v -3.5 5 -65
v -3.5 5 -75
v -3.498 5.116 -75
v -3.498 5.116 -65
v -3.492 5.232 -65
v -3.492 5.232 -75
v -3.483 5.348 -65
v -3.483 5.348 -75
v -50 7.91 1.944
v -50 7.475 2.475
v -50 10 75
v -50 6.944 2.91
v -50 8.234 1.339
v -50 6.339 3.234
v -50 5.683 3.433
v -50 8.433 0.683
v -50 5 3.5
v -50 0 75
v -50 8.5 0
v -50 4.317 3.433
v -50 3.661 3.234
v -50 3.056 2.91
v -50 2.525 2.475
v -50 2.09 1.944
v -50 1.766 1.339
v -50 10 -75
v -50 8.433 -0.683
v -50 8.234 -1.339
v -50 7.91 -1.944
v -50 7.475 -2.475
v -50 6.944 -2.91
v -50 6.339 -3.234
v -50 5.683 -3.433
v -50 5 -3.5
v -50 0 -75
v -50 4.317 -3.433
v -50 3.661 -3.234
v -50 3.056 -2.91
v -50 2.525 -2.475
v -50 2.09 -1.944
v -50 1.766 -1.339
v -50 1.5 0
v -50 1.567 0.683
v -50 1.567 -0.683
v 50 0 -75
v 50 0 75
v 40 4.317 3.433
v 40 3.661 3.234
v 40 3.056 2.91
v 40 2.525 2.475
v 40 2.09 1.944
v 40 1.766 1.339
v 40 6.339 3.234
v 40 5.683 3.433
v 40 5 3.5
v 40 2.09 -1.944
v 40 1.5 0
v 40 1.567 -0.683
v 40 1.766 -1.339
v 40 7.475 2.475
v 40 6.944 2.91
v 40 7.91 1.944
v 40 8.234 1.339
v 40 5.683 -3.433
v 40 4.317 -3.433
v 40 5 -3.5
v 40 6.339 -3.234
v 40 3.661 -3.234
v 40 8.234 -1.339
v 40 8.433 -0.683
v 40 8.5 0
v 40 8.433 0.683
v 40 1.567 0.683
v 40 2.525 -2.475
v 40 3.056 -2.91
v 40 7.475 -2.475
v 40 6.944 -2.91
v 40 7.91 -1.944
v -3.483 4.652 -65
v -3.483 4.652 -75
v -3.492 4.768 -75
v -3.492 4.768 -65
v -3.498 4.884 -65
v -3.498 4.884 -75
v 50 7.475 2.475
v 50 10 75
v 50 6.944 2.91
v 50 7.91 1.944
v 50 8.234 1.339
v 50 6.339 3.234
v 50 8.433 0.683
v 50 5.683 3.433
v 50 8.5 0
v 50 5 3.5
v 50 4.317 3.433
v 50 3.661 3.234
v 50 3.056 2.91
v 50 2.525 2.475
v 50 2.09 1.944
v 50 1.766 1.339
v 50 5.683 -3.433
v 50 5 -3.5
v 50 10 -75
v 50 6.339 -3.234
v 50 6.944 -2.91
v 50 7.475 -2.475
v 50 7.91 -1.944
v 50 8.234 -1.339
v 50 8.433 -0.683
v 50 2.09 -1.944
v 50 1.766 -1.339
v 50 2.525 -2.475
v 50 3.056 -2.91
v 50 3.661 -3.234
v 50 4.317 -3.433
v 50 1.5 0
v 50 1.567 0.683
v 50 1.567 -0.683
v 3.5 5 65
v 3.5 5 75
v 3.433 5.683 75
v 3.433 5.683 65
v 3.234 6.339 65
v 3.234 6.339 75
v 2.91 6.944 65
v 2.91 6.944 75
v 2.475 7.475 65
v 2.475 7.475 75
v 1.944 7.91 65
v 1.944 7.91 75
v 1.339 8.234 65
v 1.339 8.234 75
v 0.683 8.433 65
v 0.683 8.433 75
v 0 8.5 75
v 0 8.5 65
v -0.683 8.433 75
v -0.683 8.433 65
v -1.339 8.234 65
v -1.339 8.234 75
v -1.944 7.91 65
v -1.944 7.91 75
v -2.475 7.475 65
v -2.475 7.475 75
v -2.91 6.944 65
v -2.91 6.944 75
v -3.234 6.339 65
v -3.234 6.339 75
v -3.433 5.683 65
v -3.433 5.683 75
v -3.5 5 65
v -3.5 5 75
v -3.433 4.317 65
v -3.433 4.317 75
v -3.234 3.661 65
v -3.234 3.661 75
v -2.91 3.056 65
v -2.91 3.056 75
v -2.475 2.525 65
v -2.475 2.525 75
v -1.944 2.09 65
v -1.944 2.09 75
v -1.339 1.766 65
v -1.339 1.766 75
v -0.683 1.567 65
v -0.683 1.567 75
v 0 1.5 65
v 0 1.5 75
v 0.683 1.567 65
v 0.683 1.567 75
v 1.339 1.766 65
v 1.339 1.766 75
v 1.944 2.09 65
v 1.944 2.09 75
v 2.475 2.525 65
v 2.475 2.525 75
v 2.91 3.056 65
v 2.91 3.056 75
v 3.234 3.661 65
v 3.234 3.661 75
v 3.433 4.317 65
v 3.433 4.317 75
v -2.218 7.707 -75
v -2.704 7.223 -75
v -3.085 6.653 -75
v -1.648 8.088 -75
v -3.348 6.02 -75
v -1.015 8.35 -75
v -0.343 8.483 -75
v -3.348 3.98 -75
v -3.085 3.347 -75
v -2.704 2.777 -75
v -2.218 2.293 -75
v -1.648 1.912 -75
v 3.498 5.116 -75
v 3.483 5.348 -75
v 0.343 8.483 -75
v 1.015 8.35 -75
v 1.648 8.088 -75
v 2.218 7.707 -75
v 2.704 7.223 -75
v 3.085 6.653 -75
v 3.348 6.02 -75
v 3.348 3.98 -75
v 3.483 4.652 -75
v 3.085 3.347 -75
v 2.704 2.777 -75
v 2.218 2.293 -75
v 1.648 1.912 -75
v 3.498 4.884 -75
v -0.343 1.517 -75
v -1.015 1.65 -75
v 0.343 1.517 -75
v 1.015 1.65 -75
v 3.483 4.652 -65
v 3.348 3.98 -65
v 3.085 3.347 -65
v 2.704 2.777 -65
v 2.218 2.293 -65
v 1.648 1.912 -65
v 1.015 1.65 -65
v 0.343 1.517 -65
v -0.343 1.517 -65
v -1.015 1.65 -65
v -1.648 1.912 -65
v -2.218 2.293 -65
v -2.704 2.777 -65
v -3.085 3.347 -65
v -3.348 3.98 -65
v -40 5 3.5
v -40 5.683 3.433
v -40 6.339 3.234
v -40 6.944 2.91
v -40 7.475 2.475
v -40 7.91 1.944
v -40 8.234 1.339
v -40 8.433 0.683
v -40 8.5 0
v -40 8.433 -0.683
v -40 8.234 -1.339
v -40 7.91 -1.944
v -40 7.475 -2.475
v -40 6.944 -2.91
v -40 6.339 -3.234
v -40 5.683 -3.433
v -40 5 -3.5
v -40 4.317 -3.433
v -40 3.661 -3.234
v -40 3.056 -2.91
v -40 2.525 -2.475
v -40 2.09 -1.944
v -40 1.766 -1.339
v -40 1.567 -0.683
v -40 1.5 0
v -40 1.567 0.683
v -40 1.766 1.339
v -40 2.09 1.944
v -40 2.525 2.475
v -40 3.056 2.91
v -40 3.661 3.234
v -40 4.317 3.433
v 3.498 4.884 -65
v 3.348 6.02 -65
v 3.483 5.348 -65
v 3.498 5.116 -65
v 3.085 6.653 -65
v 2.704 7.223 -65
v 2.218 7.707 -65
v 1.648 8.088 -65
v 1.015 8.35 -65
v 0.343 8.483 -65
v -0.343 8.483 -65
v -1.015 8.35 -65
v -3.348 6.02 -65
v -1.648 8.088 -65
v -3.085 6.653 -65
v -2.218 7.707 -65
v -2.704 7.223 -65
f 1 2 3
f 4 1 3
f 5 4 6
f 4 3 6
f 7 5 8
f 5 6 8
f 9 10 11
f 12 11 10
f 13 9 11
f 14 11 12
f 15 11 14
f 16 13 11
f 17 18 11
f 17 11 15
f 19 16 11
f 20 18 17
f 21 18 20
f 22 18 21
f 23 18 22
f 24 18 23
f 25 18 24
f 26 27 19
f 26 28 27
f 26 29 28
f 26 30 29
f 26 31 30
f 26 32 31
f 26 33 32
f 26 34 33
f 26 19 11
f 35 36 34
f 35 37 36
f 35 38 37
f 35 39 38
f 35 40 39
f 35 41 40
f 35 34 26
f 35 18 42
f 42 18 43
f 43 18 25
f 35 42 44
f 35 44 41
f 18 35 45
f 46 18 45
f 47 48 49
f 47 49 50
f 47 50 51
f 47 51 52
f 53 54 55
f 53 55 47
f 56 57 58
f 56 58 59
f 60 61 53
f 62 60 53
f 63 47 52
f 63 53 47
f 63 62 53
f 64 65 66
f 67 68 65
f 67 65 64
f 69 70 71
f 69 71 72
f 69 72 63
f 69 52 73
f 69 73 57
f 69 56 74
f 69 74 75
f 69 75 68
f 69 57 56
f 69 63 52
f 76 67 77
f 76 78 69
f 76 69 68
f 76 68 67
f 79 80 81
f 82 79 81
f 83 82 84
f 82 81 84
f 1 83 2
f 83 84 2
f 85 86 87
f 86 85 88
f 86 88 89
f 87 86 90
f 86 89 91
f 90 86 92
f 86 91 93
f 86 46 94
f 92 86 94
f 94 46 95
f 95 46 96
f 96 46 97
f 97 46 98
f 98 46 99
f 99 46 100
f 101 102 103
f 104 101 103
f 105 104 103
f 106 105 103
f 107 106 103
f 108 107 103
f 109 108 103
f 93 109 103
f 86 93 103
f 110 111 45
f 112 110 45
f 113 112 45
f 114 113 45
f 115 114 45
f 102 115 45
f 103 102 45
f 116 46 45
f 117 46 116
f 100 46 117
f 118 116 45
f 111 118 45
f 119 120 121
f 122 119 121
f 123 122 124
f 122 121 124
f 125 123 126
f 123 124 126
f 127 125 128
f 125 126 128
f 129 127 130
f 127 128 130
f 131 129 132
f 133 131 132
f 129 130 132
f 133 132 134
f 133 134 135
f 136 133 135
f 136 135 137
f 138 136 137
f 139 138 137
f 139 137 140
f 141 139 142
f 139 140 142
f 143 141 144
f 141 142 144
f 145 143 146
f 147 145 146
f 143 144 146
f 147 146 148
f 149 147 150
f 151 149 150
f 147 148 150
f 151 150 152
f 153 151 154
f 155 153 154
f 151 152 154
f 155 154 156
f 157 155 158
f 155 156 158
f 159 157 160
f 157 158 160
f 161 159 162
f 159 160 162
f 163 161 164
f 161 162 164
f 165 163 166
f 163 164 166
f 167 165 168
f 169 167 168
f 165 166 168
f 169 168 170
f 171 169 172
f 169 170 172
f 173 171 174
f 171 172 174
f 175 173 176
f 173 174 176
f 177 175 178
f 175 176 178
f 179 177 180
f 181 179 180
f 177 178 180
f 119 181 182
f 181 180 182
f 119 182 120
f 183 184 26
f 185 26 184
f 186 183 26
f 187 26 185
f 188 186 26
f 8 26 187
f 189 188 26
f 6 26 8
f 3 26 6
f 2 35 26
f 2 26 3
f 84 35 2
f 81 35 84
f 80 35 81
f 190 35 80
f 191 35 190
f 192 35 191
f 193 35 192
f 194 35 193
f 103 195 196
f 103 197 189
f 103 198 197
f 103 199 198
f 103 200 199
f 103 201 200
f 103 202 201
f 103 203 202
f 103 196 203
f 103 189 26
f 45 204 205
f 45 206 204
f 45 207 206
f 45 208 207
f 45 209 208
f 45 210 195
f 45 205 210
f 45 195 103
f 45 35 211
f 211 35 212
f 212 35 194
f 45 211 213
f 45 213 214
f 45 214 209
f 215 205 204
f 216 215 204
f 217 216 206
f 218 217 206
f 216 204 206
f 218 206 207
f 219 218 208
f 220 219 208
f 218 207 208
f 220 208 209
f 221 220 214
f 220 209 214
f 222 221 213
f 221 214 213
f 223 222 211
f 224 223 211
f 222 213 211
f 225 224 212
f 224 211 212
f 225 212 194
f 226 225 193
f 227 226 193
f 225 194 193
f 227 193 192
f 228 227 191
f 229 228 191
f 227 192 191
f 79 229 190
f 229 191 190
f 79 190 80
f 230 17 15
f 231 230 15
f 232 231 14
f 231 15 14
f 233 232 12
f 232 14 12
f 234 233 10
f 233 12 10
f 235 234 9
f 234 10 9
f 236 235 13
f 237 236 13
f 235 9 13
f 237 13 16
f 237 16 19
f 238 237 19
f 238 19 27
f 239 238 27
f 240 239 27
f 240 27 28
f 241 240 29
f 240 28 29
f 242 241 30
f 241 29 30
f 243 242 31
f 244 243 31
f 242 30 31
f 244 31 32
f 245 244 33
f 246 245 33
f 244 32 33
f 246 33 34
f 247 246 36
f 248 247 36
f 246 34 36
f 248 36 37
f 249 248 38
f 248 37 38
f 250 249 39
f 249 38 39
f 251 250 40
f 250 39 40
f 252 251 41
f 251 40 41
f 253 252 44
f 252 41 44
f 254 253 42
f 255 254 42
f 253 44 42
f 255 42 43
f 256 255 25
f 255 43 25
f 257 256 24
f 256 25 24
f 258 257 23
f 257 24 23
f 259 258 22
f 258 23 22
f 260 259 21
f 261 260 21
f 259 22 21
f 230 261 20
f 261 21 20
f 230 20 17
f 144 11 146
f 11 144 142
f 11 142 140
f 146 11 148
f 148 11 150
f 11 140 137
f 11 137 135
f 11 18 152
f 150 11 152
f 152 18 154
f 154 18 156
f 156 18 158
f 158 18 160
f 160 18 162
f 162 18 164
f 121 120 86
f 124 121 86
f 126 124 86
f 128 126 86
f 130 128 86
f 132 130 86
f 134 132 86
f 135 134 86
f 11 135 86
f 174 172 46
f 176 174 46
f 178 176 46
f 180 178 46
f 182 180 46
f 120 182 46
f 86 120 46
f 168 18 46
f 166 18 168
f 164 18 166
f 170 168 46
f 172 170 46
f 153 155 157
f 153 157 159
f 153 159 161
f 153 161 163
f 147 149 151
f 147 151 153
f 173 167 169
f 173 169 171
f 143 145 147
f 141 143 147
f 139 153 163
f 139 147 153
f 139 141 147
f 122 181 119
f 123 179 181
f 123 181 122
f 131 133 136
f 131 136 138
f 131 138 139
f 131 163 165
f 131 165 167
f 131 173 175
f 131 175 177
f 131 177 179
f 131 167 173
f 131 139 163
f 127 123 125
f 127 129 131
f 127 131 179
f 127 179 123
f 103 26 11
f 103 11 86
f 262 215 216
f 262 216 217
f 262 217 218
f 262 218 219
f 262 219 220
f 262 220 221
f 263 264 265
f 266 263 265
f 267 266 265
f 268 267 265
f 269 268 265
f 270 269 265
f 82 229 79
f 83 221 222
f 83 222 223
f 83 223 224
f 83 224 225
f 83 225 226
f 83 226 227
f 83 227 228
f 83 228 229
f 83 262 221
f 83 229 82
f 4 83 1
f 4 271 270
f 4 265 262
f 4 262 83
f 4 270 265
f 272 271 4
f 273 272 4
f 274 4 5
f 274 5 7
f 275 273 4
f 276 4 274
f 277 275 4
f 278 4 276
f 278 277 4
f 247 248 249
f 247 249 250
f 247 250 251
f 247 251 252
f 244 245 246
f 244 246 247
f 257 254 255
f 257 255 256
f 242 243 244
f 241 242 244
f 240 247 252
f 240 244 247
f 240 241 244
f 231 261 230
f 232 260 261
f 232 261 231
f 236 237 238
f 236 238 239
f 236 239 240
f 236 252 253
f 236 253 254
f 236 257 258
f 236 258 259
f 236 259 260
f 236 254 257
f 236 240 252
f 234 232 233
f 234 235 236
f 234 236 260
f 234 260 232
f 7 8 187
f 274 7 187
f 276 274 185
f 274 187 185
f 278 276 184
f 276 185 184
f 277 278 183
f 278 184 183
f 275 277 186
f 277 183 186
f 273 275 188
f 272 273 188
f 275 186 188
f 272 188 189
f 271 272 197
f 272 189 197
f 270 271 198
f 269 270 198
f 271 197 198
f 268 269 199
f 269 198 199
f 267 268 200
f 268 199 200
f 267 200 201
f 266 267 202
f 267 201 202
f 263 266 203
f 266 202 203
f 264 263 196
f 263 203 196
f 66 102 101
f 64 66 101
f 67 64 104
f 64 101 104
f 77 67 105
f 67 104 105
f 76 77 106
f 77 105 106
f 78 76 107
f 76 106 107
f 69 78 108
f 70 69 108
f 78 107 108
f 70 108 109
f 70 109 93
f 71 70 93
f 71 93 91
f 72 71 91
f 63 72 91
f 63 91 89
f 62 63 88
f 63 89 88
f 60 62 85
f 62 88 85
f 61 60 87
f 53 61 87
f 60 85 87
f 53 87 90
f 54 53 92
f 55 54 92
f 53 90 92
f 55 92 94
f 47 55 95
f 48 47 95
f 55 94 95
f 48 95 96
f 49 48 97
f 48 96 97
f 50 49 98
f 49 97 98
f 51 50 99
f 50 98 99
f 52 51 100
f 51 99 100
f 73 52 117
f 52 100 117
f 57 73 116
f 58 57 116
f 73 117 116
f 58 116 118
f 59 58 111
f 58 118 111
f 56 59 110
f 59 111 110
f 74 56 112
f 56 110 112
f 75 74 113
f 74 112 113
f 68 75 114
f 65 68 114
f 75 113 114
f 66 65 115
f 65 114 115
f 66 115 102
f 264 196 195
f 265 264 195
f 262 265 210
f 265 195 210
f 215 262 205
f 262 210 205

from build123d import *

# Parameters (mm, degrees)
SKETCH_1_W          = 100
SKETCH_1_H          = 150
EXTRUDE_1_DEPTH     = 10
SKETCH_2_R          = 3.5
CUT_EXTRUDE_1_DEPTH = 10
SKETCH_3_R          = 3.5
CUT_EXTRUDE_2_DEPTH = 10
CUT_EXTRUDE_3_DEPTH = 10
SKETCH_5_R          = 3.5
CUT_EXTRUDE_4_DEPTH = 10


with BuildPart() as part:
    # 草图1 → 凸台-拉伸1 (new body)
    with BuildSketch(Plane(origin=(0, 0, 0), x_dir=(1, 0, 0), z_dir=(0, 1, 0))):
        Rectangle(SKETCH_1_W, SKETCH_1_H)
    extrude(amount=EXTRUDE_1_DEPTH)

    # 草图2 → 切除-拉伸1 (cut)
    with BuildSketch(Plane.XY.offset(75)):
        with Locations((0, 5)):
            Circle(SKETCH_2_R)
    extrude(amount=-CUT_EXTRUDE_1_DEPTH, mode=Mode.SUBTRACT)

    # 草图3 → 切除-拉伸2 (cut)
    with BuildSketch(Plane(origin=(50, 0, 0), x_dir=(0, 0, -1), z_dir=(1, 0, 0))):
        with Locations((0, 5)):
            Circle(SKETCH_3_R)
    extrude(amount=-CUT_EXTRUDE_2_DEPTH, mode=Mode.SUBTRACT)

    # 草图4 → 切除-拉伸3 (cut)
    with BuildSketch(Plane(origin=(0, 0, -75), x_dir=(-1, 0, 0), z_dir=(0, 0, -1))):
        with BuildLine():
            ThreePointArc((3.482630166, 5.348263017), (0, 8.5), (-3.482630166, 5.348263017))
            Line((-3.482630166, 5.348263017), (0, 5))
            Line((0, 5), (3.482630166, 5.348263017))
        make_face()
        with BuildLine():
            Line((0, 5), (-3.482630166, 5.348263017))
            ThreePointArc((-3.482630166, 5.348263017), (-3.5, 5), (-3.482630166, 4.651736983))
            Line((-3.482630166, 4.651736983), (0, 5))
        make_face()
        with BuildLine():
            Line((3.482630166, 5.348263017), (0, 5))
            Line((0, 5), (3.482630166, 4.651736983))
            ThreePointArc((3.482630166, 4.651736983), (3.495654844, 4.825652043), (3.5, 5))
            ThreePointArc((3.5, 5), (3.495654844, 5.174347957), (3.482630166, 5.348263017))
        make_face()
        with BuildLine():
            Line((3.482630166, 4.651736983), (0, 5))
            Line((0, 5), (-3.482630166, 4.651736983))
            ThreePointArc((-3.482630166, 4.651736983), (0, 1.5), (3.482630166, 4.651736983))
        make_face()
    extrude(amount=-CUT_EXTRUDE_3_DEPTH, mode=Mode.SUBTRACT)

    # 草图5 → 切除-拉伸4 (cut)
    with BuildSketch(Plane.ZY.offset(50)):
        with Locations((0, 5)):
            Circle(SKETCH_5_R)
    extrude(amount=-CUT_EXTRUDE_4_DEPTH, mode=Mode.SUBTRACT)


solid = part.part
